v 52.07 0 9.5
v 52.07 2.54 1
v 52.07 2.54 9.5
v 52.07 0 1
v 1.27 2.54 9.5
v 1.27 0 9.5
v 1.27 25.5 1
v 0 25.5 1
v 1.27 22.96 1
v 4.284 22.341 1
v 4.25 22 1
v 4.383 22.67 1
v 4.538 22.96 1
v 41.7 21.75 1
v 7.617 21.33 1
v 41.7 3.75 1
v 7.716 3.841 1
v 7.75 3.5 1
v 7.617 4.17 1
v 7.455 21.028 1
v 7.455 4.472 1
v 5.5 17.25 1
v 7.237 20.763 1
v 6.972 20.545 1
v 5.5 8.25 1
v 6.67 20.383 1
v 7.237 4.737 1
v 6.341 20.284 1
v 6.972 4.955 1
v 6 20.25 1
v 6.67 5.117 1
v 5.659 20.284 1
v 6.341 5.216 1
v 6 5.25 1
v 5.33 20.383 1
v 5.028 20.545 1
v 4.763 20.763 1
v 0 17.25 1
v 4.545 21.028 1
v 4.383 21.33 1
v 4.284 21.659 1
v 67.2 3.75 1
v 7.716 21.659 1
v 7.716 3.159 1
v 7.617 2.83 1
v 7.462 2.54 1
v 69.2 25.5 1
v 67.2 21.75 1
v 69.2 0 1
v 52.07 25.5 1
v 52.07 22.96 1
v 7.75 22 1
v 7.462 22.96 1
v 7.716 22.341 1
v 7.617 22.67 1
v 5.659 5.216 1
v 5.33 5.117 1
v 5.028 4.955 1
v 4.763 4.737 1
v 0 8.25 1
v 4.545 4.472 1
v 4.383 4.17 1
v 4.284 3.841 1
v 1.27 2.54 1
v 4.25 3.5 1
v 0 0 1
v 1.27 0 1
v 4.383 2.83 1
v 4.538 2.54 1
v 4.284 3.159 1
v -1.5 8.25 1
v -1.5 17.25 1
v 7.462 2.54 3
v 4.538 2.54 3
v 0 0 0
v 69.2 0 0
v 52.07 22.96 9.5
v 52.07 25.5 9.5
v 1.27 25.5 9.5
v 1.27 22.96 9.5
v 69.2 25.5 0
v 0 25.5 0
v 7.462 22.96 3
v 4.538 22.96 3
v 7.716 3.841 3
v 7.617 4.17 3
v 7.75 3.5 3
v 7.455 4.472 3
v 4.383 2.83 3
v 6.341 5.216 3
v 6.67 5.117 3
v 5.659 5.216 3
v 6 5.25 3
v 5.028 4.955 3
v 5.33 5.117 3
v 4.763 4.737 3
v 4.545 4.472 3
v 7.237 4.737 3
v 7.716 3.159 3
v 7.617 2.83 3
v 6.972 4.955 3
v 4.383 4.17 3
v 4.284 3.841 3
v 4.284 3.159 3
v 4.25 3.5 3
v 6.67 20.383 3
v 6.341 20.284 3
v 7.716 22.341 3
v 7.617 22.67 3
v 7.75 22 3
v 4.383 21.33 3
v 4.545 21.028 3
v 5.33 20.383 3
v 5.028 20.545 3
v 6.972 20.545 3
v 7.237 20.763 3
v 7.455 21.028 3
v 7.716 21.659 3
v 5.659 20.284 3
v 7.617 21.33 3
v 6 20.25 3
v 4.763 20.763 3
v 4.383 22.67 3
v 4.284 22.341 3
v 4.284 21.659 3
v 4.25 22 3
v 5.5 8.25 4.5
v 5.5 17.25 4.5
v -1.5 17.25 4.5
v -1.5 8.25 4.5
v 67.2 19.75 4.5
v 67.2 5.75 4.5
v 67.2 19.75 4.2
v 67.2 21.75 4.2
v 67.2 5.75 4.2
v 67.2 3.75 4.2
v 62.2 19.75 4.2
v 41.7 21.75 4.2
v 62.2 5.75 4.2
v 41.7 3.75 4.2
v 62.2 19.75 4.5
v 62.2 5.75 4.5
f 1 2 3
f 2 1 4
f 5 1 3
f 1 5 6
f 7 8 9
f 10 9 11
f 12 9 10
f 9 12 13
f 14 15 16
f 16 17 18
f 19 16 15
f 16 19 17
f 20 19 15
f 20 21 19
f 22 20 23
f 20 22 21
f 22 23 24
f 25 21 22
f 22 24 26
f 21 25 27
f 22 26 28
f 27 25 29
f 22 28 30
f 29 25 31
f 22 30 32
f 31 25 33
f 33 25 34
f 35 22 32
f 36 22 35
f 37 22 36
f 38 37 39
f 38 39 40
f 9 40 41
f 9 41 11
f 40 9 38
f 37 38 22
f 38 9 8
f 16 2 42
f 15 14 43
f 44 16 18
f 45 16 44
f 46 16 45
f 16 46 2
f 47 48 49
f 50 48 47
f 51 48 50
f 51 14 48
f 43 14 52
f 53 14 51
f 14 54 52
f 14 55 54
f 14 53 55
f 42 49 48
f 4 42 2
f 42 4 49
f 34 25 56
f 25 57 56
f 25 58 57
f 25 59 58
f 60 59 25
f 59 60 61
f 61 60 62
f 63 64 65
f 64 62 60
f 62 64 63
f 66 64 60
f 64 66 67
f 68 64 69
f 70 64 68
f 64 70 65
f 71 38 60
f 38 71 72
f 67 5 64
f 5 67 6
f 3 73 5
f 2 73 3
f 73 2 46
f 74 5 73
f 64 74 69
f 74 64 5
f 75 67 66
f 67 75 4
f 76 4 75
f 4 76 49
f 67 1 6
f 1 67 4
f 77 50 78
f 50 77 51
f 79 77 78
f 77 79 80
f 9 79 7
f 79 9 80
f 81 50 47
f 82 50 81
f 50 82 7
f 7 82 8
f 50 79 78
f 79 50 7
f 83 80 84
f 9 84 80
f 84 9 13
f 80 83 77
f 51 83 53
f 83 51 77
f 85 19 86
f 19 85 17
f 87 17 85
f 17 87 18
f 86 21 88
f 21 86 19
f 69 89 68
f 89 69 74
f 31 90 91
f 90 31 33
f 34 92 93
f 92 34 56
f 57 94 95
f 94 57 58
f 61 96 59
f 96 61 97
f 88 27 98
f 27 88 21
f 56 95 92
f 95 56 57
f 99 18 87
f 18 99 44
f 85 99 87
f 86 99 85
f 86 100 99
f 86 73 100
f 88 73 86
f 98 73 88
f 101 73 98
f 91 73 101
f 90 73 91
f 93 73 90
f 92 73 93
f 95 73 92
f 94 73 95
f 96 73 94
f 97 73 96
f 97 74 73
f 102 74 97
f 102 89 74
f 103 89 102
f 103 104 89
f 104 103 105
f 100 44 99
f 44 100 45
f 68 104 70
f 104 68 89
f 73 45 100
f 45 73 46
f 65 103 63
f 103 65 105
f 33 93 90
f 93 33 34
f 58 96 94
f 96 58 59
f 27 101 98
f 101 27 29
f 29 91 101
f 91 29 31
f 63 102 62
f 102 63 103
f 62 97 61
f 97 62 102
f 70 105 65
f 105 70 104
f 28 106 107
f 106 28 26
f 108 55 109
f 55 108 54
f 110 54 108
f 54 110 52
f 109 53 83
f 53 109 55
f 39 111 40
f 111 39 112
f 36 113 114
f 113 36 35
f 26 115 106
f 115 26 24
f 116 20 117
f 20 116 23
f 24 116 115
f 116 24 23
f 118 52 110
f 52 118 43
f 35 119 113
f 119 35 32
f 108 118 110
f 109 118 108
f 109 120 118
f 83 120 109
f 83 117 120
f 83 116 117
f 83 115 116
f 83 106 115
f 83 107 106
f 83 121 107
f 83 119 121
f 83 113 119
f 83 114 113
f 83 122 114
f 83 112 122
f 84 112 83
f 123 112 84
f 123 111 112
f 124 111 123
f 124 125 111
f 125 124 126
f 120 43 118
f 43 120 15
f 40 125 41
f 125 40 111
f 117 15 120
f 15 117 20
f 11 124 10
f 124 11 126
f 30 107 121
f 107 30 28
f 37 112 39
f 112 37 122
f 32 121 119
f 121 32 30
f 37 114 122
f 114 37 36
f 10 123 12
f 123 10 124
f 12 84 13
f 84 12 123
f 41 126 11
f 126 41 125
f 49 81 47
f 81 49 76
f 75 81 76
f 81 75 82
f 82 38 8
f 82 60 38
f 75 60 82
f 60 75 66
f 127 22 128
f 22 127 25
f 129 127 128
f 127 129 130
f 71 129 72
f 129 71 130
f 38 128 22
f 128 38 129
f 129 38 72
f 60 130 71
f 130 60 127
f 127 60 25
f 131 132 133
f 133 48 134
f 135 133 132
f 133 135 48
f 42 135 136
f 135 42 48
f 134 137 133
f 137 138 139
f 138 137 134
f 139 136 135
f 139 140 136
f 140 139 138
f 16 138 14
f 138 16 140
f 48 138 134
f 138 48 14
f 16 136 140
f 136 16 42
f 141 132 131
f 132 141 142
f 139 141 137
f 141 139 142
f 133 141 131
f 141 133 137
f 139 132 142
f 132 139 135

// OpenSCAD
$fn = 32;
pcb_w = 69.2; pcb_h = 25.5; pcb_t = 1.0;

// PCB
color("green") cube([pcb_w, pcb_h, pcb_t]);

// Pin headers: 2x 20-pin along long edges
color([0.2,0.2,0.2]) {
    translate([1.27, 0, pcb_t]) cube([20*2.54, 2.54, 8.5]);
    translate([1.27, pcb_h-2.54, pcb_t]) cube([20*2.54, 2.54, 8.5]);
}

// USB-C connector
color("silver") translate([-1.5, (pcb_h-9)/2, pcb_t]) cube([7, 9, 3.5]);

// ESP32-S3-WROOM module
color("silver") translate([pcb_w-25.5-2.0, (pcb_h-18)/2, pcb_t]) cube([25.5, 18, 3.2]);

// Antenna area
color([0.9,0.85,0.7]) translate([pcb_w-7.0, (pcb_h-14)/2, pcb_t+3.2]) cube([5.0, 14, 0.3]);

// Reset + Boot buttons
color([0.3,0.3,0.3]) {
    translate([6.0, 3.5, pcb_t]) cylinder(d=3.5, h=2.0);
    translate([6.0, pcb_h-3.5, pcb_t]) cylinder(d=3.5, h=2.0);
}
